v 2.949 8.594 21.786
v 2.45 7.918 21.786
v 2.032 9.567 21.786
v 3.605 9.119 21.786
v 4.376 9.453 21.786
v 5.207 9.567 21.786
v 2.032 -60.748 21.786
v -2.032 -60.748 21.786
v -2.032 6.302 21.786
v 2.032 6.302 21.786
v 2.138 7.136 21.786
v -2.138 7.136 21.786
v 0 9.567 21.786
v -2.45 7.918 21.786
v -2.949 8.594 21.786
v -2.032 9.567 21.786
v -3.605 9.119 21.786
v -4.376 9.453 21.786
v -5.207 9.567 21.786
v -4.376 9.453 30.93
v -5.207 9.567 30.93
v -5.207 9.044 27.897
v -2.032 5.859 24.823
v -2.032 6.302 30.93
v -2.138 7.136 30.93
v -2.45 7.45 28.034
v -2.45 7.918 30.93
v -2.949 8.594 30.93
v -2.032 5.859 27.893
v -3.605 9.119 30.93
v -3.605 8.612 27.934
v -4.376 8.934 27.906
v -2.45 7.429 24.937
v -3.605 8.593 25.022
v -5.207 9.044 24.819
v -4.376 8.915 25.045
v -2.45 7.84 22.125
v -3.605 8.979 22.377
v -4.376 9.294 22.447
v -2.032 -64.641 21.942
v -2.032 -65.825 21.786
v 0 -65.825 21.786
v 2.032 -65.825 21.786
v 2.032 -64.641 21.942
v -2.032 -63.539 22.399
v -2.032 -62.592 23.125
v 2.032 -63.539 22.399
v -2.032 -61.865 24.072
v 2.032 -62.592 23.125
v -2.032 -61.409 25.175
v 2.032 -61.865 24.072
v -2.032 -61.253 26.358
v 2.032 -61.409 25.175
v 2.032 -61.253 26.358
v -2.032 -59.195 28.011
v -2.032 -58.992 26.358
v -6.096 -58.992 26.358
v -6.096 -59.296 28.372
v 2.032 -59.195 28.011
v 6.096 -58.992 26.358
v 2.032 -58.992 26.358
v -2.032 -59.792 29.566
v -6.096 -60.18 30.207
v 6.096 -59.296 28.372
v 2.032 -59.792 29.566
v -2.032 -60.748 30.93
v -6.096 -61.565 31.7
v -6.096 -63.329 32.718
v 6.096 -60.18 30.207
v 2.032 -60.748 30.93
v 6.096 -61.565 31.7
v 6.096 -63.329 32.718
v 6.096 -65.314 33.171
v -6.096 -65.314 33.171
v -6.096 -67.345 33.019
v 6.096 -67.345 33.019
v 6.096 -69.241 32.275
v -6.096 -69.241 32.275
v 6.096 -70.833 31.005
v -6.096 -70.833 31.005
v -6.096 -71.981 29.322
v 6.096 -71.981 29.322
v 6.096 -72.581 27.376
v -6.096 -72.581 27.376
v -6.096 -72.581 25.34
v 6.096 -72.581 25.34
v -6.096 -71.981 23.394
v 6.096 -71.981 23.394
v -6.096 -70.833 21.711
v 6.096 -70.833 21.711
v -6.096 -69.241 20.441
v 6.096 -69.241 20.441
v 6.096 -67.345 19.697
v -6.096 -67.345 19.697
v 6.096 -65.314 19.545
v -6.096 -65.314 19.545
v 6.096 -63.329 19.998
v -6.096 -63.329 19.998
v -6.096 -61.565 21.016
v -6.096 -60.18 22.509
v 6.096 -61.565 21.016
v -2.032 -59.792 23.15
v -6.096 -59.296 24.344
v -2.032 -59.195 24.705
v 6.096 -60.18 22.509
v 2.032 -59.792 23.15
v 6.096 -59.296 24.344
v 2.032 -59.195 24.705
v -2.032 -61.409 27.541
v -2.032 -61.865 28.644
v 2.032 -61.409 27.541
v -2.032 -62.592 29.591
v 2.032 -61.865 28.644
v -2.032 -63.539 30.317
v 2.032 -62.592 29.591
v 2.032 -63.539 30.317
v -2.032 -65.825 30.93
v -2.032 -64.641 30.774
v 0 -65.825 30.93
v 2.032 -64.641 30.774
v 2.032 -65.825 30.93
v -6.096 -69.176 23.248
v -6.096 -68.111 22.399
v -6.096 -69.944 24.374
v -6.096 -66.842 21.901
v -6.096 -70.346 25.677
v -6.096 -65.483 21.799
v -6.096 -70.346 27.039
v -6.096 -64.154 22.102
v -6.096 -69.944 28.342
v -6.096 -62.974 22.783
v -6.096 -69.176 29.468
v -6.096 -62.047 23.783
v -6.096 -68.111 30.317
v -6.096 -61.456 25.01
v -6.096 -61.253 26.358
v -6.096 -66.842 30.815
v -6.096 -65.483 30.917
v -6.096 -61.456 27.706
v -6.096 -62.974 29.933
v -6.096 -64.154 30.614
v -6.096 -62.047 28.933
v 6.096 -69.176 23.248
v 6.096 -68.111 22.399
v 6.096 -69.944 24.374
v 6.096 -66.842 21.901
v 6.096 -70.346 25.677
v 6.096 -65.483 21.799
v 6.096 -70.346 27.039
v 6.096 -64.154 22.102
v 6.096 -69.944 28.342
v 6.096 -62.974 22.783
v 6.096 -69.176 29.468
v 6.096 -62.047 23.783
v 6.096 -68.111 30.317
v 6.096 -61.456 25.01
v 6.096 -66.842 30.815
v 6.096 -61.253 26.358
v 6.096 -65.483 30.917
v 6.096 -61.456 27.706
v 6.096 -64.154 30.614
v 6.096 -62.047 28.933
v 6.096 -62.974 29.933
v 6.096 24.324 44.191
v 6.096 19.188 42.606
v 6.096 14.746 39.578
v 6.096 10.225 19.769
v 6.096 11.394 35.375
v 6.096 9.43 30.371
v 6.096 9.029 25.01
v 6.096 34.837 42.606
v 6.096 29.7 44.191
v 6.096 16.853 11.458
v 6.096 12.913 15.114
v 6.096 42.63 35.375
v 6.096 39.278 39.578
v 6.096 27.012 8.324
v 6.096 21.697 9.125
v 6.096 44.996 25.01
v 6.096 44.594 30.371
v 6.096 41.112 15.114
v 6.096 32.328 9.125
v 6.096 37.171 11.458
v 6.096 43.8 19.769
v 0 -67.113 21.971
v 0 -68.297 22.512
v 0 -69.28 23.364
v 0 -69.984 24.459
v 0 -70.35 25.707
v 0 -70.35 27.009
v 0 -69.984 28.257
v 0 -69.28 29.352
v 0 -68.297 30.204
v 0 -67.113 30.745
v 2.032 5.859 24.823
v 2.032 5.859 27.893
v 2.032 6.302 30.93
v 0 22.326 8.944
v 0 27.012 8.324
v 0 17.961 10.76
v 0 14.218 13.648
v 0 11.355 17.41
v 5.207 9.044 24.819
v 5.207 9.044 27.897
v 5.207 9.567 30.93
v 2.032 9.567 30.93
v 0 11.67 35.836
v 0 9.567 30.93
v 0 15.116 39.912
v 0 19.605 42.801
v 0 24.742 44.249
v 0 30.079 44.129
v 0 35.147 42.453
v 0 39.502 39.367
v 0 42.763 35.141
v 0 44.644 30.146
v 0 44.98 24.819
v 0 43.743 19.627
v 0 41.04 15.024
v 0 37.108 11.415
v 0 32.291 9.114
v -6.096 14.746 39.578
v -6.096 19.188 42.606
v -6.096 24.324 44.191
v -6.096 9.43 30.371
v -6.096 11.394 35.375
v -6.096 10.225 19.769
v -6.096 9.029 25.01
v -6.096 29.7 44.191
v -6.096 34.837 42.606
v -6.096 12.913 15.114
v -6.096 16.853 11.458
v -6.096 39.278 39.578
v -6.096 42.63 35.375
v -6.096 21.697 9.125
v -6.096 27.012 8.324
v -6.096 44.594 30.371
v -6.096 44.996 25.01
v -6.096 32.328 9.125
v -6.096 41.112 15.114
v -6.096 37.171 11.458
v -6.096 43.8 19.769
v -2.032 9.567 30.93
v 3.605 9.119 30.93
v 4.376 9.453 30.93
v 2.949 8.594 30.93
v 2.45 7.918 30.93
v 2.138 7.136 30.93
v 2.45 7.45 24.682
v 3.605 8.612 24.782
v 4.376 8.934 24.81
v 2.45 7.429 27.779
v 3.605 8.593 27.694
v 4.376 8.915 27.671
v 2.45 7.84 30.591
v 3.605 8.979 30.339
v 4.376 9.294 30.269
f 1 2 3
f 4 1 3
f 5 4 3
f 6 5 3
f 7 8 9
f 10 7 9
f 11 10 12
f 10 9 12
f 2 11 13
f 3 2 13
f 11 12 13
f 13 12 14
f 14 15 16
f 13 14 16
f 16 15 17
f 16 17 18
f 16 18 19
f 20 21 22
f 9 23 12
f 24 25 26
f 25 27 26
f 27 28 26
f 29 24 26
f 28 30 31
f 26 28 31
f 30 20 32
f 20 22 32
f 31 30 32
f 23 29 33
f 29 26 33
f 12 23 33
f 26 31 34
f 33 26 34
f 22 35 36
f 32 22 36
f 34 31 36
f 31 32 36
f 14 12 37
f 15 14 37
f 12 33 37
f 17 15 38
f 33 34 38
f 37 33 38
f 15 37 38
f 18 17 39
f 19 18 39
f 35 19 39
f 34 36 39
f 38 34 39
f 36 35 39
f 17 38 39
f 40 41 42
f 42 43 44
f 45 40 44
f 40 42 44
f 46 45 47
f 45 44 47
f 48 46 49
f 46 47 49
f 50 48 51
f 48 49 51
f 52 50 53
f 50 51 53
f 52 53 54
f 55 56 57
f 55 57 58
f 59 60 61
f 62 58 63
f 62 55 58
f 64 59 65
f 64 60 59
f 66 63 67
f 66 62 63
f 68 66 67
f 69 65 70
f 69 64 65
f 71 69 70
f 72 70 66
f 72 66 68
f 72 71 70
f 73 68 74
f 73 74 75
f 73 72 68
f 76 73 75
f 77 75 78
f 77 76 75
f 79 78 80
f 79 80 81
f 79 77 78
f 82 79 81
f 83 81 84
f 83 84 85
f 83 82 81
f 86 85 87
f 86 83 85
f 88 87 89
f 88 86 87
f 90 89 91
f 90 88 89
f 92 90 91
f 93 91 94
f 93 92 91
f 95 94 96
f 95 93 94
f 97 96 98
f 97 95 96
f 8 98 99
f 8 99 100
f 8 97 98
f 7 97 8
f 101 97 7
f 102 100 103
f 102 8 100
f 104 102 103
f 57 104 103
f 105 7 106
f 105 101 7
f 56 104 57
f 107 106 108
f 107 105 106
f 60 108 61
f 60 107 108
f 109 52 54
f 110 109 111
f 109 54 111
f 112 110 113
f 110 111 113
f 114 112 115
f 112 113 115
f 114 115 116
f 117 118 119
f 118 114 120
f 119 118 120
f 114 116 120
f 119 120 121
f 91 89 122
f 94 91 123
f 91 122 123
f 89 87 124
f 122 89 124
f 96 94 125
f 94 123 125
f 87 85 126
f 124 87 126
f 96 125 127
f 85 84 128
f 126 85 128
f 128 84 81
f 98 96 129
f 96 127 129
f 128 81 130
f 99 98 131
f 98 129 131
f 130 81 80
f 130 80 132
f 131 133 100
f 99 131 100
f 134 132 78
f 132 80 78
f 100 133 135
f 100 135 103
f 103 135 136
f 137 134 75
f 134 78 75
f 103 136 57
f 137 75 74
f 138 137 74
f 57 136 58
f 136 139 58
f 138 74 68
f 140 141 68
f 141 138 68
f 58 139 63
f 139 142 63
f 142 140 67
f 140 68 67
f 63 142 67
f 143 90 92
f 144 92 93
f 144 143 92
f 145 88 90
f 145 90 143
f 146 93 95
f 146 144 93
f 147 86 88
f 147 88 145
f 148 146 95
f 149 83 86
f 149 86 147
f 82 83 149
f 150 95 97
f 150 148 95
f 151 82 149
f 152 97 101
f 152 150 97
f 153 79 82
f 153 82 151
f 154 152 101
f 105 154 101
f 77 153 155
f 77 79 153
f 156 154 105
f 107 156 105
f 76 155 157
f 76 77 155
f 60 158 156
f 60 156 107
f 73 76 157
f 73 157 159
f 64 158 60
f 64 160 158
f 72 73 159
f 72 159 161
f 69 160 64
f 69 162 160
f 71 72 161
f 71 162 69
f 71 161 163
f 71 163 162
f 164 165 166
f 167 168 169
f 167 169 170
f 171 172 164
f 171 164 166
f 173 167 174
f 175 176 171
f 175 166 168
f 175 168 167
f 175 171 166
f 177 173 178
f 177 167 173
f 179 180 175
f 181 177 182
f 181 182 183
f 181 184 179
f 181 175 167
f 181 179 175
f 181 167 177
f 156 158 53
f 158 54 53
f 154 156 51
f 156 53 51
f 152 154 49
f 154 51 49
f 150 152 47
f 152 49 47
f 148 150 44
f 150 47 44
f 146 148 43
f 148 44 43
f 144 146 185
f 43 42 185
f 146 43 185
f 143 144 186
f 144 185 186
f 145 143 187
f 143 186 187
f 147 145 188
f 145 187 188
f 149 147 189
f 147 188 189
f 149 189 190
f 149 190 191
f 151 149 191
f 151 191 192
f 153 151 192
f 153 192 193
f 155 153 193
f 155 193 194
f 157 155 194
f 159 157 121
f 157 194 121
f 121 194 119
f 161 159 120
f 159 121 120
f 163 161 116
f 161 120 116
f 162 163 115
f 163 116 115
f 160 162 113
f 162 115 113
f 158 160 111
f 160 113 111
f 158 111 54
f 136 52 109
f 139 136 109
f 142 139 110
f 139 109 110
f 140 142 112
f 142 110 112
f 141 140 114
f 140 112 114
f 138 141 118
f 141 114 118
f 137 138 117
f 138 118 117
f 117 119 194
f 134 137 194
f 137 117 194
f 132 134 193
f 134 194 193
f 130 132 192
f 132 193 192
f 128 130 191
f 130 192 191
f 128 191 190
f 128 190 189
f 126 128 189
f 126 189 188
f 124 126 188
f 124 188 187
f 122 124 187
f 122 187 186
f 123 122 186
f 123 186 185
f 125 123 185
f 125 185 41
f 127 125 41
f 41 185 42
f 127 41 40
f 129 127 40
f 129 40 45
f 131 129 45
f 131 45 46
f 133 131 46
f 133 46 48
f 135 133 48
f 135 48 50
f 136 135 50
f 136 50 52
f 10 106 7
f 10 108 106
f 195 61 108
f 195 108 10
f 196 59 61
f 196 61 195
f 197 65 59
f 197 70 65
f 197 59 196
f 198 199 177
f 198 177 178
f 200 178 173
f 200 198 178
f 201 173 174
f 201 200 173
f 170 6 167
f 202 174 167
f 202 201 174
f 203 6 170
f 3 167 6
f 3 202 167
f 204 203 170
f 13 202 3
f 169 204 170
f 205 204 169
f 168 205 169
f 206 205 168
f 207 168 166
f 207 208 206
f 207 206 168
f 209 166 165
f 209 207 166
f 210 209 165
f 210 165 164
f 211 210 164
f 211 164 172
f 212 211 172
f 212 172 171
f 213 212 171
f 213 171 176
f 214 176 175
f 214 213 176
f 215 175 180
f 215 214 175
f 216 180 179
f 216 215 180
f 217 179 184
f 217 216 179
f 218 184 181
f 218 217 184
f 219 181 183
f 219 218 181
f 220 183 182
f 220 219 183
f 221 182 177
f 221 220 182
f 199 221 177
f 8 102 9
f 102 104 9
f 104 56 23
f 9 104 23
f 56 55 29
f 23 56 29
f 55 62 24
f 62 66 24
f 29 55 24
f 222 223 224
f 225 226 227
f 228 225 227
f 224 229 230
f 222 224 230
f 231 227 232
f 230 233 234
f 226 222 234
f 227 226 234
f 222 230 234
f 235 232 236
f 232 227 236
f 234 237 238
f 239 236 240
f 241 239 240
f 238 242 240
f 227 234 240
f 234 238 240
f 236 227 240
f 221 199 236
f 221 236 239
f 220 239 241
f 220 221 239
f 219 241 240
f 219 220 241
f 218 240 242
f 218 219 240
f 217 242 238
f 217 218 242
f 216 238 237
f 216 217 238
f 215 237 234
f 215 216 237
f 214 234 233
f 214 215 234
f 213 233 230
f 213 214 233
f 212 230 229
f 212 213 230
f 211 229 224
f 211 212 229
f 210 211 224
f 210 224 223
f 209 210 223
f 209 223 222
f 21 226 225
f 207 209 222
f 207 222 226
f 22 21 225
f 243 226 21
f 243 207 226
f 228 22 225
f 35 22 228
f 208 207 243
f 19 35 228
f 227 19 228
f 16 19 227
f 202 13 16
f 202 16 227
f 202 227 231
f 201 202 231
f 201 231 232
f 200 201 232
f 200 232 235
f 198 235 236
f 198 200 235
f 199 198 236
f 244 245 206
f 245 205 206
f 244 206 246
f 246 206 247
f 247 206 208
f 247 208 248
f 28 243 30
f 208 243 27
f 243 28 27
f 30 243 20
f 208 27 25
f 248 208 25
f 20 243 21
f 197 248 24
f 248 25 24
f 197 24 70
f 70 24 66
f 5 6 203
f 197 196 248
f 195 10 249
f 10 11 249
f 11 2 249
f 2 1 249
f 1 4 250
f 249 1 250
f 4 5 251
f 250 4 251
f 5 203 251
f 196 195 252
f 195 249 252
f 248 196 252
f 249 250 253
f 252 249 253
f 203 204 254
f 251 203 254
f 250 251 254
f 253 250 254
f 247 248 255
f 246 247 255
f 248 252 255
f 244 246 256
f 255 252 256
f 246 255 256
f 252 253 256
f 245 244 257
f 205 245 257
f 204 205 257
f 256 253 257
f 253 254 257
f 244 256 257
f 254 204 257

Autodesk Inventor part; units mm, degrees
ref_plane "YZ Plane" through (0, 0, 0) normal (1, 0, 0) x (0, 1, 0)
ref_plane "XZ Plane" through (0, 0, 0) normal (0, 1, 0) x (-1, 0, 0)
sketch "Sketch1" plane through (0, 0, 0) normal (1, 0, 0) x (0, 1, 0)
  line L0 (9.8672, 30.93) -> (-65.8248, 30.93)
  line L1 (-65.8248, 30.93) -> (-65.8248, 21.786)
  line L2 (-65.8248, 21.786) -> (9.8672, 21.786)
  line L3 (9.8672, 21.786) -> (9.8672, 30.93)
  circle A0 centre (-65.8248, 26.358) radius 4.572
  circle A1 centre (-65.8248, 26.358) radius 6.8324
  point P0 (0, 0)
  dimension "d0" = 75.692
  dimension "d1" = 9.144
extrude "Extrusion3" add sketch "Sketch1" along normal mid plane 4.064 contours L3 L2 A1 L0 | A1 L2 A0 L0 | A0 L1 picked at (-59.8517, 25.4679) picked at (-64.4517, 25.6968)
extrude "Extrusion4" add sketch "Sketch1" along normal mid plane 12.192 contours A1 L2 A0 L0 | L0 A0 L2 A1
extrude "Extrusion5" cut sketch "Sketch1" along normal mid plane 12.192 contours A0 L1 | L1 A0
ref_plane "Work Plane1" through (0, 0, 0) normal (1, 0, 0) x (0, 0, -1)
sketch "Sketch2" plane through (0, 0, 0) normal (1, 0, 0) x (0, 0, -1)
  line L0 (-30.93, 9.8672) -> (-21.786, 9.8672) projected
  line L1 (-26.358, 9.8672) -> (-26.358, 27.0122)
  circle A0 centre (-26.358, 27.0122) radius 18.034
  point P0 (0, 0)
  dimension "d12" = 17.145
  dimension "d13" = 36.068
extrude "Extrusion6" add sketch "Sketch2" along normal mid plane 12.192
fillet "Fillet1" radius 3.175 2 edges at (2.032, 8.9782, 26.358) (-2.032, 8.9782, 26.358)
properties part number "pendulum"
